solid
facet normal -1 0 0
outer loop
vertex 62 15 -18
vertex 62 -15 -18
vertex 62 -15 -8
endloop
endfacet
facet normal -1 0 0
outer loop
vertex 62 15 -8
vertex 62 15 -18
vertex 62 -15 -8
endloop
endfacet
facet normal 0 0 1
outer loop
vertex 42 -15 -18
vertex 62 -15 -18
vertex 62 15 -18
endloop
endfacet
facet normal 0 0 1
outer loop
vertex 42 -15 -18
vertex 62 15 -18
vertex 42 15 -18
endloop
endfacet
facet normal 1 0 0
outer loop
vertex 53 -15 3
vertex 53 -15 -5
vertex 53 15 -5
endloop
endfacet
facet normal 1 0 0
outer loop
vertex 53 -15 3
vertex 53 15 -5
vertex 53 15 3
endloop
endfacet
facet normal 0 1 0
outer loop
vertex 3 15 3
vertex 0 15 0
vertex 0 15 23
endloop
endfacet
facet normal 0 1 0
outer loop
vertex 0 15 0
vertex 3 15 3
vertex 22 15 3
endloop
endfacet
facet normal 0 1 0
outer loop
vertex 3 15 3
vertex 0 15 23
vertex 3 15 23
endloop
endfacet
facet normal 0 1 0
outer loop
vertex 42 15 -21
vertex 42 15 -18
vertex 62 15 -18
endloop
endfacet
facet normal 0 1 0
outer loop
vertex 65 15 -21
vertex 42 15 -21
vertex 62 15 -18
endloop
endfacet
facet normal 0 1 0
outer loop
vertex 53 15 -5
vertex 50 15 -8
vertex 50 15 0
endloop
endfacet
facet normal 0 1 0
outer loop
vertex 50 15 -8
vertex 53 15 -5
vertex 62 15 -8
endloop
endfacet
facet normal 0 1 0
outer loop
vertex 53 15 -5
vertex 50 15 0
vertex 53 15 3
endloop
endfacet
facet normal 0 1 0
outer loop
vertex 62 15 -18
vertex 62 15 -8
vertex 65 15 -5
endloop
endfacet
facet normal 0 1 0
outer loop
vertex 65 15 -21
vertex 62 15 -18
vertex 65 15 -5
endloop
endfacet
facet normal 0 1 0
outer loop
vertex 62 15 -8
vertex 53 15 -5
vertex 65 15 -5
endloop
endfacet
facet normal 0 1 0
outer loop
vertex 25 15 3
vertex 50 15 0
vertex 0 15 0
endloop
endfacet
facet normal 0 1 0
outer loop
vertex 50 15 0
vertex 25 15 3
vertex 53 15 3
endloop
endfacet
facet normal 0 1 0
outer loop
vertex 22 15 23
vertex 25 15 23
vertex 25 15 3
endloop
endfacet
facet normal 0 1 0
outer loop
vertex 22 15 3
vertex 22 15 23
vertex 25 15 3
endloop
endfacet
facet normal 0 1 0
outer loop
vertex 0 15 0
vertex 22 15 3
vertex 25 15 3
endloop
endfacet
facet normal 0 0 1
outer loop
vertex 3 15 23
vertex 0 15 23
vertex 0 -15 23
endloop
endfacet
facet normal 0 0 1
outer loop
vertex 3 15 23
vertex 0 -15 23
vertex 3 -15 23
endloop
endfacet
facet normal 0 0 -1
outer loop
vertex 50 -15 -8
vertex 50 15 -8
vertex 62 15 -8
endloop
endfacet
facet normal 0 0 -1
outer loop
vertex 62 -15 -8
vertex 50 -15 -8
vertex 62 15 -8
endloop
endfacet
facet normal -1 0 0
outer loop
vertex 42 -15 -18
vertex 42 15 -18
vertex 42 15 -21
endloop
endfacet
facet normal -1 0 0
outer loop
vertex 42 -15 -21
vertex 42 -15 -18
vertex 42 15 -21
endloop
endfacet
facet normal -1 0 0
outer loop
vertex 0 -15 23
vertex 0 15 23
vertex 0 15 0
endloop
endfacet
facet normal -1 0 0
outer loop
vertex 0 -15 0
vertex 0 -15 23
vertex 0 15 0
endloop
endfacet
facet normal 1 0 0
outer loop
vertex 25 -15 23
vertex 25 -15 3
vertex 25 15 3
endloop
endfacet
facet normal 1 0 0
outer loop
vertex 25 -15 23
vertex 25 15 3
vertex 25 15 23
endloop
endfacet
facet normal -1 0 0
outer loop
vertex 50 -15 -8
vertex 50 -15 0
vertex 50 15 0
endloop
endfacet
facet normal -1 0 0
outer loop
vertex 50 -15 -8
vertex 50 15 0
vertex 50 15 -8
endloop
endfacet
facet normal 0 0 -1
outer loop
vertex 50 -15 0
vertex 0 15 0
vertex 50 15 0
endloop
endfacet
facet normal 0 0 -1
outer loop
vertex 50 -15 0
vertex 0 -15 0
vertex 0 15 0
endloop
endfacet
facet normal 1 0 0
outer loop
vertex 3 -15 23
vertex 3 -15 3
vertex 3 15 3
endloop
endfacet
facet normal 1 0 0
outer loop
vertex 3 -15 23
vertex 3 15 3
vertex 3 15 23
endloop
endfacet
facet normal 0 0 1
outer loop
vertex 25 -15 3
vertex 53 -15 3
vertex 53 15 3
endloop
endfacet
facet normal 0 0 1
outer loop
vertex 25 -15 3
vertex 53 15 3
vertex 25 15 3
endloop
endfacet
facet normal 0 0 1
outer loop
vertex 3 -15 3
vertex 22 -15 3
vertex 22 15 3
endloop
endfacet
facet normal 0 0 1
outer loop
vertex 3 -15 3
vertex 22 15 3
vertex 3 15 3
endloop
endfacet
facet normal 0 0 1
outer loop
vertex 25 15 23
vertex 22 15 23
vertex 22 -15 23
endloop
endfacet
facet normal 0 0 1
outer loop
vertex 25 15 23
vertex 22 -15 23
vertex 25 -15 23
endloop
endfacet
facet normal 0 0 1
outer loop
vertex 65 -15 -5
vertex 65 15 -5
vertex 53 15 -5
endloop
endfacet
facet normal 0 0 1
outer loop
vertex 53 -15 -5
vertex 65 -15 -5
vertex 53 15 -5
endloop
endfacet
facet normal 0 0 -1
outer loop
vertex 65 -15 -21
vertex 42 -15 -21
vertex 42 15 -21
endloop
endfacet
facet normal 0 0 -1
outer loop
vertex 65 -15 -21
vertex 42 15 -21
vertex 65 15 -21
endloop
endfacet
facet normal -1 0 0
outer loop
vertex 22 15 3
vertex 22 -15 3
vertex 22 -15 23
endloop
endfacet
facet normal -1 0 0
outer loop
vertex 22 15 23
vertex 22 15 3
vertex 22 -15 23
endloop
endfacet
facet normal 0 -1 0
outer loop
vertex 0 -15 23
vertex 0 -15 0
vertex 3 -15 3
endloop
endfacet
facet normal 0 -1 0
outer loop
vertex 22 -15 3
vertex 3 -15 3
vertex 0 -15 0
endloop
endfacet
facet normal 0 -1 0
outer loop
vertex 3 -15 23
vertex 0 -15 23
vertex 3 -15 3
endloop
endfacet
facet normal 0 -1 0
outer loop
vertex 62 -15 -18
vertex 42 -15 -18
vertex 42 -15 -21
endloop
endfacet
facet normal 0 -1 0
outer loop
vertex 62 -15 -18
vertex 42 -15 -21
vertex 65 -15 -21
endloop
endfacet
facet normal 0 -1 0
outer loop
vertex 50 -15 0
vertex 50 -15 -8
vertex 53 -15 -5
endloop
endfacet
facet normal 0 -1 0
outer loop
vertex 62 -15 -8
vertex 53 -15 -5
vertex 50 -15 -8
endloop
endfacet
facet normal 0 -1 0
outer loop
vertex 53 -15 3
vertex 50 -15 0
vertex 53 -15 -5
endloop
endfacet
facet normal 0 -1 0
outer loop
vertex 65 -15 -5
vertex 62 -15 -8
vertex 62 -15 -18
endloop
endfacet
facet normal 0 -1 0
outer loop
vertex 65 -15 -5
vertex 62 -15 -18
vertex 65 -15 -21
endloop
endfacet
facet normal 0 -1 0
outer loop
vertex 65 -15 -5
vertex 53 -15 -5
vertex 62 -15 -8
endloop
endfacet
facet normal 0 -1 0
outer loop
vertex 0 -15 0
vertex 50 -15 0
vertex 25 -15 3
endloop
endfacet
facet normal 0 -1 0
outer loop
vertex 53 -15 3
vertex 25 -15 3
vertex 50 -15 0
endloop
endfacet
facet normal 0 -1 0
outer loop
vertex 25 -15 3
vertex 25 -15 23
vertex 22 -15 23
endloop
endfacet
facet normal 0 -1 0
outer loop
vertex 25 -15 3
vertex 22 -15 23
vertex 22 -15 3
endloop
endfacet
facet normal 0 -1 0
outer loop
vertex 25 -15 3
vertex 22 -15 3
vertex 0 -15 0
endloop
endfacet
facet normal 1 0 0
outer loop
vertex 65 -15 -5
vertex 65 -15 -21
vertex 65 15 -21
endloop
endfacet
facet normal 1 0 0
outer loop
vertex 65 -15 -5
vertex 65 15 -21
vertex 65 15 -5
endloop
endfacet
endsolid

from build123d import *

# Parameters (mm, degrees)
F0_W          = 3
F0_H          = 3
F0_W_2        = 19
F0_H_2        = 20
F0_W_3        = 25
F0_W_4        = 9
F0_H_3        = 10
F1_DEPTH      = 15
F1_DEPTH_BACK = 15


with BuildPart() as f1:
    # F0 (on Front) → F1 (new body, two sides)
    with BuildSketch(Plane.XZ) as f1_sk:
        with Locations((1.5, 1.5)):
            Rectangle(F0_W, F0_H)
        with Locations((12.5, 1.5)):
            Rectangle(F0_W_2, F0_H)
        with Locations((1.5, 13)):
            Rectangle(F0_W, F0_H_2)
        with Locations((23.5, 1.5)):
            Rectangle(F0_W, F0_H)
        with Locations((23.5, 13)):
            Rectangle(F0_W, F0_H_2)
        with Locations((37.5, 1.5)):
            Rectangle(F0_W_3, F0_H)
        Polygon((50, 3), (50, 0), (50, -5), (53, -5), (53, 3), align=None)
        with Locations((51.5, -6.5)):
            Rectangle(F0_W, F0_H)
        with Locations((57.5, -6.5)):
            Rectangle(F0_W_4, F0_H)
        with Locations((63.5, -6.5)):
            Rectangle(F0_W, F0_H)
        with Locations((63.5, -13)):
            Rectangle(F0_W, F0_H_3)
        Polygon((65, -18), (62, -18), (42, -18), (42, -21), (65, -21), align=None)
    extrude(amount=F1_DEPTH)
    extrude(f1_sk.sketch, amount=-F1_DEPTH_BACK)


solid = f1.part
